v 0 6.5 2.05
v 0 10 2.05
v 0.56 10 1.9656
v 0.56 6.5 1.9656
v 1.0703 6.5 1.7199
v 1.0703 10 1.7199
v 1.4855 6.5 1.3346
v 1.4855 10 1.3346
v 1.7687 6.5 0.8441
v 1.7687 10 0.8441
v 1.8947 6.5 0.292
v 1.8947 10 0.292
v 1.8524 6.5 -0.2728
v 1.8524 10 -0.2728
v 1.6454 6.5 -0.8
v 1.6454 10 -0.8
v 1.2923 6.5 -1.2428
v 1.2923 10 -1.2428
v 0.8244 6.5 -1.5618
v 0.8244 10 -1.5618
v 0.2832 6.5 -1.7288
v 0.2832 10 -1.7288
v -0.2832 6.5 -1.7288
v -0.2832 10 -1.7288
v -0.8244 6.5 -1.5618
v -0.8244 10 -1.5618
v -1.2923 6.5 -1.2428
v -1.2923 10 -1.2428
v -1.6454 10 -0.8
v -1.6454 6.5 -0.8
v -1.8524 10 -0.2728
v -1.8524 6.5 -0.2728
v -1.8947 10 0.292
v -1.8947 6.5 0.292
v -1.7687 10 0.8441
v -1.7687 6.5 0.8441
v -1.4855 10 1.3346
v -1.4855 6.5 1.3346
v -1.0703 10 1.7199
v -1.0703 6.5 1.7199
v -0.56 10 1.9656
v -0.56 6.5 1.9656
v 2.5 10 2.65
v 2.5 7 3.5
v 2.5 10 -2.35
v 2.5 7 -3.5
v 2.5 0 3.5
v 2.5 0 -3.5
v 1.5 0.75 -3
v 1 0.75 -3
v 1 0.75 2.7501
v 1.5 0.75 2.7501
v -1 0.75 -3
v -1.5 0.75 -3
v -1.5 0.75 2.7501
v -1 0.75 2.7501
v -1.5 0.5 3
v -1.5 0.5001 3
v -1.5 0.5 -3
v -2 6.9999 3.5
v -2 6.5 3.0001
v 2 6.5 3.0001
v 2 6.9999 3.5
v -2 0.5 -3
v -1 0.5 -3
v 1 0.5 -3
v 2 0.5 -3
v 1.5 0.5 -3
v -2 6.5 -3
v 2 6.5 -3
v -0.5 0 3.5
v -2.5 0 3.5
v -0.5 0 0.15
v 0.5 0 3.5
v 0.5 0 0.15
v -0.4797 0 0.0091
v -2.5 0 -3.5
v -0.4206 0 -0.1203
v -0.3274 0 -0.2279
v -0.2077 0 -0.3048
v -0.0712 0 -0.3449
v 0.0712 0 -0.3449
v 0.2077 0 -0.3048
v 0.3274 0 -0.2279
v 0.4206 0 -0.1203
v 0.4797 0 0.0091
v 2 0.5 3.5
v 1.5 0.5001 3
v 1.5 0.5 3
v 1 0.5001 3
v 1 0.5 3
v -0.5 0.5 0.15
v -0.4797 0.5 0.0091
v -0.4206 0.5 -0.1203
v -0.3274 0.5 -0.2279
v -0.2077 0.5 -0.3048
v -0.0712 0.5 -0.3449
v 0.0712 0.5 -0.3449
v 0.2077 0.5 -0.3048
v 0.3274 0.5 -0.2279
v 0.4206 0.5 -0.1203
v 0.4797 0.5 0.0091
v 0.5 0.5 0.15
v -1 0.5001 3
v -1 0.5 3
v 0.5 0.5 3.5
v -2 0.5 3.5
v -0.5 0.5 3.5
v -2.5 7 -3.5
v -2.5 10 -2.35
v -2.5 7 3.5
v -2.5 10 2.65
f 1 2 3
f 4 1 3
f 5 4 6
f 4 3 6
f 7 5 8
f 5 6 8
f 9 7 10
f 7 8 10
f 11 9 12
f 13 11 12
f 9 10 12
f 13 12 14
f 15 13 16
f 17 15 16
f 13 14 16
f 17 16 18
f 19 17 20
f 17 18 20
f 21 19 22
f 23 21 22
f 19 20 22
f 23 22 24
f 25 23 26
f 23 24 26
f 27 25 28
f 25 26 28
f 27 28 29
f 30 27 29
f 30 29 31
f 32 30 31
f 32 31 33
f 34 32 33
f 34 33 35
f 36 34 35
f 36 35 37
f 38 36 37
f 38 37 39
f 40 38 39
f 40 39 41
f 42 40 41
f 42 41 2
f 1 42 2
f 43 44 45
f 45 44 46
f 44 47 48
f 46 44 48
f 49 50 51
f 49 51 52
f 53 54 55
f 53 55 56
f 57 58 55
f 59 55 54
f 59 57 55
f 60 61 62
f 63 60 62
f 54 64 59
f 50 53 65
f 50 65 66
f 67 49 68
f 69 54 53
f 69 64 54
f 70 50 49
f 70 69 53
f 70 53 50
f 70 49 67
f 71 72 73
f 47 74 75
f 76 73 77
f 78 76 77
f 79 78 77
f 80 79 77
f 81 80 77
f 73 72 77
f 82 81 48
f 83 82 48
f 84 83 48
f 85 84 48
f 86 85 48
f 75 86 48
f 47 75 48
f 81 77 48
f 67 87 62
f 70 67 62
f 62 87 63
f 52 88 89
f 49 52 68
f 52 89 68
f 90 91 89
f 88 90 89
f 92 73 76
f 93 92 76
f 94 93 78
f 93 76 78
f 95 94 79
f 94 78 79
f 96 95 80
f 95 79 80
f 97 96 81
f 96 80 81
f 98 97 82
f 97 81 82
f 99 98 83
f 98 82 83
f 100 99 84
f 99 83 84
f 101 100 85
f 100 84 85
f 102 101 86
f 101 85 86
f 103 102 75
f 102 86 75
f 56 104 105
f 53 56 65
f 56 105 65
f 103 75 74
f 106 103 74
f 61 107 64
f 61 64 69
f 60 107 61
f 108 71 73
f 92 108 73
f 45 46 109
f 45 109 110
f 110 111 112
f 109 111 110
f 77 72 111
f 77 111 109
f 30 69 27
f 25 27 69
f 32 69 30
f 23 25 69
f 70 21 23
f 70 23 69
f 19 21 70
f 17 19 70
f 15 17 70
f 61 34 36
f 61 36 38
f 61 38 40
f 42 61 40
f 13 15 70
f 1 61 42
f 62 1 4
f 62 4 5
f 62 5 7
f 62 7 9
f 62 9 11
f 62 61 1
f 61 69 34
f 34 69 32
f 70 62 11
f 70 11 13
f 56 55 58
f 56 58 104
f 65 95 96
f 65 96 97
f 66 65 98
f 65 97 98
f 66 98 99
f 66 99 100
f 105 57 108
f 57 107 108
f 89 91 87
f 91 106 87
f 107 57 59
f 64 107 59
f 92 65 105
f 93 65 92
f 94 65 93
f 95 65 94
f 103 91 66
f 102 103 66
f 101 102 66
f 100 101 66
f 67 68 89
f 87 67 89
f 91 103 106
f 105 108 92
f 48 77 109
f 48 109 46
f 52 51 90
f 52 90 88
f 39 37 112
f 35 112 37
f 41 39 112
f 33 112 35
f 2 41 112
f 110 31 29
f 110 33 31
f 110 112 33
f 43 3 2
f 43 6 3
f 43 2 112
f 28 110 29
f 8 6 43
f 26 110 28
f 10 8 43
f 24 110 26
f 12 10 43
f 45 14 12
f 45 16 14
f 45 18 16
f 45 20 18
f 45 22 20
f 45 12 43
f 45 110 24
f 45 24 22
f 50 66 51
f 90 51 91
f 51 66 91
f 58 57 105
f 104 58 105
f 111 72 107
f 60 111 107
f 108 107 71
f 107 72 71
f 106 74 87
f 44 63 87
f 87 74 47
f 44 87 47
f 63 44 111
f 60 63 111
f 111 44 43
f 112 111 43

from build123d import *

# Parameters (mm, degrees)
SKETCH1_W           = 5
SKETCH1_H           = 7
BOSS_EXTRUDE1_DEPTH = 10
CUT_EXTRUDE1_DEPTH  = 12.715374514
SKETCH3_W           = 4
SKETCH3_H           = 6
CUT_EXTRUDE2_DEPTH  = 6.5
CUT_EXTRUDE3_REACH  = 12.886
SKETCH4_R           = 1.9
CUT_EXTRUDE4_REACH  = 12.886
SKETCH6_W           = 0.5
SKETCH6_H           = 6
BOSS_EXTRUDE3_DEPTH = 0.25
CHAMFER1_SIZE       = 0.25
CHAMFER2_SIZE       = 0.5


with BuildPart() as part:
    # Sketch1 → Boss-Extrude1 (new body)
    with BuildSketch(Plane(origin=(0, 0, 0), x_dir=(1, 0, 0), z_dir=(0, 1, 0))):
        Rectangle(SKETCH1_W, SKETCH1_H)
    extrude(amount=BOSS_EXTRUDE1_DEPTH)

    # Sketch2 → Cut-Extrude1 (cut, through all)
    with BuildSketch(Plane(origin=(2.5, 0, 0), x_dir=(0, 0, -1), z_dir=(1, 0, 0))):
        Polygon((-3.5, 7), (-2.65, 10), (-3.5, 10), align=None)
        Polygon((2.35, 10), (3.5, 10), (3.5, 7), align=None)
    extrude(amount=-CUT_EXTRUDE1_DEPTH, mode=Mode.SUBTRACT)

    # Sketch3 → Cut-Extrude2 (cut)
    with BuildSketch(Plane.XY.offset(3.5)):
        with Locations((0, 3.5)):
            Rectangle(SKETCH3_W, SKETCH3_H)
    extrude(amount=-CUT_EXTRUDE2_DEPTH, mode=Mode.SUBTRACT)

    # Sketch4 → Cut-Extrude3 (cut, up to next)
    with BuildSketch(Plane(origin=(0, 10, 0), x_dir=(1, 0, 0), z_dir=(0, 1, 0)), mode=Mode.PRIVATE) as cut_extrude3_sk1:
        with Locations(Location((0, -0.15, 0), (0, 0, 270))):
            Circle(SKETCH4_R)
    cut_extrude3_tool1 = extrude(cut_extrude3_sk1.sketch, amount=-CUT_EXTRUDE3_REACH, mode=Mode.PRIVATE) & part.part
    add(cut_extrude3_tool1.solids().sort_by_distance((0, 10, 0.15))[0], mode=Mode.SUBTRACT)

    # Sketch5 → Cut-Extrude4 (cut, up to next)
    with BuildSketch(Plane.XZ, mode=Mode.PRIVATE) as cut_extrude4_sk1:
        with BuildLine():
            Line((-0.5, 3.5), (-0.5, 0.15))
            ThreePointArc((-0.5, 0.15), (0, -0.35), (0.5, 0.15))
            Line((0.5, 0.15), (0.5, 3.5))
            Line((0.5, 3.5), (-0.5, 3.5))
        make_face()
    cut_extrude4_tool1 = extrude(cut_extrude4_sk1.sketch, amount=-CUT_EXTRUDE4_REACH, mode=Mode.PRIVATE) & part.part
    add(cut_extrude4_tool1.solids().sort_by_distance((0, 0, 1.626987))[0], mode=Mode.SUBTRACT)

    # Sketch6 → Boss-Extrude3 (add)
    with BuildSketch(Plane(origin=(0, 0.5, 0), x_dir=(1, 0, 0), z_dir=(0, 1, 0))):
        with Locations((-1.25, 0)):
            Rectangle(SKETCH6_W, SKETCH6_H)
        Polygon((1.5, 3), (1, 3), (1, -3), (1.5, -3), (1.5, 0), align=None)
    extrude(amount=BOSS_EXTRUDE3_DEPTH)

    # Chamfer1
    chamfer1_edges = [part.edges().sort_by_distance(p)[0] for p in [
        (1.25, 0.75, 3),
        (-1.25, 0.75, 3),
    ]]
    chamfer(chamfer1_edges, length=CHAMFER1_SIZE - 0.0001)  # a hair under: the kernel refuses the full size

    # Chamfer2
    chamfer2_edges = [part.edges().sort_by_distance(p)[0] for p in [
        (0, 6.5, 3.5),
    ]]
    chamfer(chamfer2_edges, length=CHAMFER2_SIZE - 0.0001)  # a hair under: the kernel refuses the full size


solid = part.part
